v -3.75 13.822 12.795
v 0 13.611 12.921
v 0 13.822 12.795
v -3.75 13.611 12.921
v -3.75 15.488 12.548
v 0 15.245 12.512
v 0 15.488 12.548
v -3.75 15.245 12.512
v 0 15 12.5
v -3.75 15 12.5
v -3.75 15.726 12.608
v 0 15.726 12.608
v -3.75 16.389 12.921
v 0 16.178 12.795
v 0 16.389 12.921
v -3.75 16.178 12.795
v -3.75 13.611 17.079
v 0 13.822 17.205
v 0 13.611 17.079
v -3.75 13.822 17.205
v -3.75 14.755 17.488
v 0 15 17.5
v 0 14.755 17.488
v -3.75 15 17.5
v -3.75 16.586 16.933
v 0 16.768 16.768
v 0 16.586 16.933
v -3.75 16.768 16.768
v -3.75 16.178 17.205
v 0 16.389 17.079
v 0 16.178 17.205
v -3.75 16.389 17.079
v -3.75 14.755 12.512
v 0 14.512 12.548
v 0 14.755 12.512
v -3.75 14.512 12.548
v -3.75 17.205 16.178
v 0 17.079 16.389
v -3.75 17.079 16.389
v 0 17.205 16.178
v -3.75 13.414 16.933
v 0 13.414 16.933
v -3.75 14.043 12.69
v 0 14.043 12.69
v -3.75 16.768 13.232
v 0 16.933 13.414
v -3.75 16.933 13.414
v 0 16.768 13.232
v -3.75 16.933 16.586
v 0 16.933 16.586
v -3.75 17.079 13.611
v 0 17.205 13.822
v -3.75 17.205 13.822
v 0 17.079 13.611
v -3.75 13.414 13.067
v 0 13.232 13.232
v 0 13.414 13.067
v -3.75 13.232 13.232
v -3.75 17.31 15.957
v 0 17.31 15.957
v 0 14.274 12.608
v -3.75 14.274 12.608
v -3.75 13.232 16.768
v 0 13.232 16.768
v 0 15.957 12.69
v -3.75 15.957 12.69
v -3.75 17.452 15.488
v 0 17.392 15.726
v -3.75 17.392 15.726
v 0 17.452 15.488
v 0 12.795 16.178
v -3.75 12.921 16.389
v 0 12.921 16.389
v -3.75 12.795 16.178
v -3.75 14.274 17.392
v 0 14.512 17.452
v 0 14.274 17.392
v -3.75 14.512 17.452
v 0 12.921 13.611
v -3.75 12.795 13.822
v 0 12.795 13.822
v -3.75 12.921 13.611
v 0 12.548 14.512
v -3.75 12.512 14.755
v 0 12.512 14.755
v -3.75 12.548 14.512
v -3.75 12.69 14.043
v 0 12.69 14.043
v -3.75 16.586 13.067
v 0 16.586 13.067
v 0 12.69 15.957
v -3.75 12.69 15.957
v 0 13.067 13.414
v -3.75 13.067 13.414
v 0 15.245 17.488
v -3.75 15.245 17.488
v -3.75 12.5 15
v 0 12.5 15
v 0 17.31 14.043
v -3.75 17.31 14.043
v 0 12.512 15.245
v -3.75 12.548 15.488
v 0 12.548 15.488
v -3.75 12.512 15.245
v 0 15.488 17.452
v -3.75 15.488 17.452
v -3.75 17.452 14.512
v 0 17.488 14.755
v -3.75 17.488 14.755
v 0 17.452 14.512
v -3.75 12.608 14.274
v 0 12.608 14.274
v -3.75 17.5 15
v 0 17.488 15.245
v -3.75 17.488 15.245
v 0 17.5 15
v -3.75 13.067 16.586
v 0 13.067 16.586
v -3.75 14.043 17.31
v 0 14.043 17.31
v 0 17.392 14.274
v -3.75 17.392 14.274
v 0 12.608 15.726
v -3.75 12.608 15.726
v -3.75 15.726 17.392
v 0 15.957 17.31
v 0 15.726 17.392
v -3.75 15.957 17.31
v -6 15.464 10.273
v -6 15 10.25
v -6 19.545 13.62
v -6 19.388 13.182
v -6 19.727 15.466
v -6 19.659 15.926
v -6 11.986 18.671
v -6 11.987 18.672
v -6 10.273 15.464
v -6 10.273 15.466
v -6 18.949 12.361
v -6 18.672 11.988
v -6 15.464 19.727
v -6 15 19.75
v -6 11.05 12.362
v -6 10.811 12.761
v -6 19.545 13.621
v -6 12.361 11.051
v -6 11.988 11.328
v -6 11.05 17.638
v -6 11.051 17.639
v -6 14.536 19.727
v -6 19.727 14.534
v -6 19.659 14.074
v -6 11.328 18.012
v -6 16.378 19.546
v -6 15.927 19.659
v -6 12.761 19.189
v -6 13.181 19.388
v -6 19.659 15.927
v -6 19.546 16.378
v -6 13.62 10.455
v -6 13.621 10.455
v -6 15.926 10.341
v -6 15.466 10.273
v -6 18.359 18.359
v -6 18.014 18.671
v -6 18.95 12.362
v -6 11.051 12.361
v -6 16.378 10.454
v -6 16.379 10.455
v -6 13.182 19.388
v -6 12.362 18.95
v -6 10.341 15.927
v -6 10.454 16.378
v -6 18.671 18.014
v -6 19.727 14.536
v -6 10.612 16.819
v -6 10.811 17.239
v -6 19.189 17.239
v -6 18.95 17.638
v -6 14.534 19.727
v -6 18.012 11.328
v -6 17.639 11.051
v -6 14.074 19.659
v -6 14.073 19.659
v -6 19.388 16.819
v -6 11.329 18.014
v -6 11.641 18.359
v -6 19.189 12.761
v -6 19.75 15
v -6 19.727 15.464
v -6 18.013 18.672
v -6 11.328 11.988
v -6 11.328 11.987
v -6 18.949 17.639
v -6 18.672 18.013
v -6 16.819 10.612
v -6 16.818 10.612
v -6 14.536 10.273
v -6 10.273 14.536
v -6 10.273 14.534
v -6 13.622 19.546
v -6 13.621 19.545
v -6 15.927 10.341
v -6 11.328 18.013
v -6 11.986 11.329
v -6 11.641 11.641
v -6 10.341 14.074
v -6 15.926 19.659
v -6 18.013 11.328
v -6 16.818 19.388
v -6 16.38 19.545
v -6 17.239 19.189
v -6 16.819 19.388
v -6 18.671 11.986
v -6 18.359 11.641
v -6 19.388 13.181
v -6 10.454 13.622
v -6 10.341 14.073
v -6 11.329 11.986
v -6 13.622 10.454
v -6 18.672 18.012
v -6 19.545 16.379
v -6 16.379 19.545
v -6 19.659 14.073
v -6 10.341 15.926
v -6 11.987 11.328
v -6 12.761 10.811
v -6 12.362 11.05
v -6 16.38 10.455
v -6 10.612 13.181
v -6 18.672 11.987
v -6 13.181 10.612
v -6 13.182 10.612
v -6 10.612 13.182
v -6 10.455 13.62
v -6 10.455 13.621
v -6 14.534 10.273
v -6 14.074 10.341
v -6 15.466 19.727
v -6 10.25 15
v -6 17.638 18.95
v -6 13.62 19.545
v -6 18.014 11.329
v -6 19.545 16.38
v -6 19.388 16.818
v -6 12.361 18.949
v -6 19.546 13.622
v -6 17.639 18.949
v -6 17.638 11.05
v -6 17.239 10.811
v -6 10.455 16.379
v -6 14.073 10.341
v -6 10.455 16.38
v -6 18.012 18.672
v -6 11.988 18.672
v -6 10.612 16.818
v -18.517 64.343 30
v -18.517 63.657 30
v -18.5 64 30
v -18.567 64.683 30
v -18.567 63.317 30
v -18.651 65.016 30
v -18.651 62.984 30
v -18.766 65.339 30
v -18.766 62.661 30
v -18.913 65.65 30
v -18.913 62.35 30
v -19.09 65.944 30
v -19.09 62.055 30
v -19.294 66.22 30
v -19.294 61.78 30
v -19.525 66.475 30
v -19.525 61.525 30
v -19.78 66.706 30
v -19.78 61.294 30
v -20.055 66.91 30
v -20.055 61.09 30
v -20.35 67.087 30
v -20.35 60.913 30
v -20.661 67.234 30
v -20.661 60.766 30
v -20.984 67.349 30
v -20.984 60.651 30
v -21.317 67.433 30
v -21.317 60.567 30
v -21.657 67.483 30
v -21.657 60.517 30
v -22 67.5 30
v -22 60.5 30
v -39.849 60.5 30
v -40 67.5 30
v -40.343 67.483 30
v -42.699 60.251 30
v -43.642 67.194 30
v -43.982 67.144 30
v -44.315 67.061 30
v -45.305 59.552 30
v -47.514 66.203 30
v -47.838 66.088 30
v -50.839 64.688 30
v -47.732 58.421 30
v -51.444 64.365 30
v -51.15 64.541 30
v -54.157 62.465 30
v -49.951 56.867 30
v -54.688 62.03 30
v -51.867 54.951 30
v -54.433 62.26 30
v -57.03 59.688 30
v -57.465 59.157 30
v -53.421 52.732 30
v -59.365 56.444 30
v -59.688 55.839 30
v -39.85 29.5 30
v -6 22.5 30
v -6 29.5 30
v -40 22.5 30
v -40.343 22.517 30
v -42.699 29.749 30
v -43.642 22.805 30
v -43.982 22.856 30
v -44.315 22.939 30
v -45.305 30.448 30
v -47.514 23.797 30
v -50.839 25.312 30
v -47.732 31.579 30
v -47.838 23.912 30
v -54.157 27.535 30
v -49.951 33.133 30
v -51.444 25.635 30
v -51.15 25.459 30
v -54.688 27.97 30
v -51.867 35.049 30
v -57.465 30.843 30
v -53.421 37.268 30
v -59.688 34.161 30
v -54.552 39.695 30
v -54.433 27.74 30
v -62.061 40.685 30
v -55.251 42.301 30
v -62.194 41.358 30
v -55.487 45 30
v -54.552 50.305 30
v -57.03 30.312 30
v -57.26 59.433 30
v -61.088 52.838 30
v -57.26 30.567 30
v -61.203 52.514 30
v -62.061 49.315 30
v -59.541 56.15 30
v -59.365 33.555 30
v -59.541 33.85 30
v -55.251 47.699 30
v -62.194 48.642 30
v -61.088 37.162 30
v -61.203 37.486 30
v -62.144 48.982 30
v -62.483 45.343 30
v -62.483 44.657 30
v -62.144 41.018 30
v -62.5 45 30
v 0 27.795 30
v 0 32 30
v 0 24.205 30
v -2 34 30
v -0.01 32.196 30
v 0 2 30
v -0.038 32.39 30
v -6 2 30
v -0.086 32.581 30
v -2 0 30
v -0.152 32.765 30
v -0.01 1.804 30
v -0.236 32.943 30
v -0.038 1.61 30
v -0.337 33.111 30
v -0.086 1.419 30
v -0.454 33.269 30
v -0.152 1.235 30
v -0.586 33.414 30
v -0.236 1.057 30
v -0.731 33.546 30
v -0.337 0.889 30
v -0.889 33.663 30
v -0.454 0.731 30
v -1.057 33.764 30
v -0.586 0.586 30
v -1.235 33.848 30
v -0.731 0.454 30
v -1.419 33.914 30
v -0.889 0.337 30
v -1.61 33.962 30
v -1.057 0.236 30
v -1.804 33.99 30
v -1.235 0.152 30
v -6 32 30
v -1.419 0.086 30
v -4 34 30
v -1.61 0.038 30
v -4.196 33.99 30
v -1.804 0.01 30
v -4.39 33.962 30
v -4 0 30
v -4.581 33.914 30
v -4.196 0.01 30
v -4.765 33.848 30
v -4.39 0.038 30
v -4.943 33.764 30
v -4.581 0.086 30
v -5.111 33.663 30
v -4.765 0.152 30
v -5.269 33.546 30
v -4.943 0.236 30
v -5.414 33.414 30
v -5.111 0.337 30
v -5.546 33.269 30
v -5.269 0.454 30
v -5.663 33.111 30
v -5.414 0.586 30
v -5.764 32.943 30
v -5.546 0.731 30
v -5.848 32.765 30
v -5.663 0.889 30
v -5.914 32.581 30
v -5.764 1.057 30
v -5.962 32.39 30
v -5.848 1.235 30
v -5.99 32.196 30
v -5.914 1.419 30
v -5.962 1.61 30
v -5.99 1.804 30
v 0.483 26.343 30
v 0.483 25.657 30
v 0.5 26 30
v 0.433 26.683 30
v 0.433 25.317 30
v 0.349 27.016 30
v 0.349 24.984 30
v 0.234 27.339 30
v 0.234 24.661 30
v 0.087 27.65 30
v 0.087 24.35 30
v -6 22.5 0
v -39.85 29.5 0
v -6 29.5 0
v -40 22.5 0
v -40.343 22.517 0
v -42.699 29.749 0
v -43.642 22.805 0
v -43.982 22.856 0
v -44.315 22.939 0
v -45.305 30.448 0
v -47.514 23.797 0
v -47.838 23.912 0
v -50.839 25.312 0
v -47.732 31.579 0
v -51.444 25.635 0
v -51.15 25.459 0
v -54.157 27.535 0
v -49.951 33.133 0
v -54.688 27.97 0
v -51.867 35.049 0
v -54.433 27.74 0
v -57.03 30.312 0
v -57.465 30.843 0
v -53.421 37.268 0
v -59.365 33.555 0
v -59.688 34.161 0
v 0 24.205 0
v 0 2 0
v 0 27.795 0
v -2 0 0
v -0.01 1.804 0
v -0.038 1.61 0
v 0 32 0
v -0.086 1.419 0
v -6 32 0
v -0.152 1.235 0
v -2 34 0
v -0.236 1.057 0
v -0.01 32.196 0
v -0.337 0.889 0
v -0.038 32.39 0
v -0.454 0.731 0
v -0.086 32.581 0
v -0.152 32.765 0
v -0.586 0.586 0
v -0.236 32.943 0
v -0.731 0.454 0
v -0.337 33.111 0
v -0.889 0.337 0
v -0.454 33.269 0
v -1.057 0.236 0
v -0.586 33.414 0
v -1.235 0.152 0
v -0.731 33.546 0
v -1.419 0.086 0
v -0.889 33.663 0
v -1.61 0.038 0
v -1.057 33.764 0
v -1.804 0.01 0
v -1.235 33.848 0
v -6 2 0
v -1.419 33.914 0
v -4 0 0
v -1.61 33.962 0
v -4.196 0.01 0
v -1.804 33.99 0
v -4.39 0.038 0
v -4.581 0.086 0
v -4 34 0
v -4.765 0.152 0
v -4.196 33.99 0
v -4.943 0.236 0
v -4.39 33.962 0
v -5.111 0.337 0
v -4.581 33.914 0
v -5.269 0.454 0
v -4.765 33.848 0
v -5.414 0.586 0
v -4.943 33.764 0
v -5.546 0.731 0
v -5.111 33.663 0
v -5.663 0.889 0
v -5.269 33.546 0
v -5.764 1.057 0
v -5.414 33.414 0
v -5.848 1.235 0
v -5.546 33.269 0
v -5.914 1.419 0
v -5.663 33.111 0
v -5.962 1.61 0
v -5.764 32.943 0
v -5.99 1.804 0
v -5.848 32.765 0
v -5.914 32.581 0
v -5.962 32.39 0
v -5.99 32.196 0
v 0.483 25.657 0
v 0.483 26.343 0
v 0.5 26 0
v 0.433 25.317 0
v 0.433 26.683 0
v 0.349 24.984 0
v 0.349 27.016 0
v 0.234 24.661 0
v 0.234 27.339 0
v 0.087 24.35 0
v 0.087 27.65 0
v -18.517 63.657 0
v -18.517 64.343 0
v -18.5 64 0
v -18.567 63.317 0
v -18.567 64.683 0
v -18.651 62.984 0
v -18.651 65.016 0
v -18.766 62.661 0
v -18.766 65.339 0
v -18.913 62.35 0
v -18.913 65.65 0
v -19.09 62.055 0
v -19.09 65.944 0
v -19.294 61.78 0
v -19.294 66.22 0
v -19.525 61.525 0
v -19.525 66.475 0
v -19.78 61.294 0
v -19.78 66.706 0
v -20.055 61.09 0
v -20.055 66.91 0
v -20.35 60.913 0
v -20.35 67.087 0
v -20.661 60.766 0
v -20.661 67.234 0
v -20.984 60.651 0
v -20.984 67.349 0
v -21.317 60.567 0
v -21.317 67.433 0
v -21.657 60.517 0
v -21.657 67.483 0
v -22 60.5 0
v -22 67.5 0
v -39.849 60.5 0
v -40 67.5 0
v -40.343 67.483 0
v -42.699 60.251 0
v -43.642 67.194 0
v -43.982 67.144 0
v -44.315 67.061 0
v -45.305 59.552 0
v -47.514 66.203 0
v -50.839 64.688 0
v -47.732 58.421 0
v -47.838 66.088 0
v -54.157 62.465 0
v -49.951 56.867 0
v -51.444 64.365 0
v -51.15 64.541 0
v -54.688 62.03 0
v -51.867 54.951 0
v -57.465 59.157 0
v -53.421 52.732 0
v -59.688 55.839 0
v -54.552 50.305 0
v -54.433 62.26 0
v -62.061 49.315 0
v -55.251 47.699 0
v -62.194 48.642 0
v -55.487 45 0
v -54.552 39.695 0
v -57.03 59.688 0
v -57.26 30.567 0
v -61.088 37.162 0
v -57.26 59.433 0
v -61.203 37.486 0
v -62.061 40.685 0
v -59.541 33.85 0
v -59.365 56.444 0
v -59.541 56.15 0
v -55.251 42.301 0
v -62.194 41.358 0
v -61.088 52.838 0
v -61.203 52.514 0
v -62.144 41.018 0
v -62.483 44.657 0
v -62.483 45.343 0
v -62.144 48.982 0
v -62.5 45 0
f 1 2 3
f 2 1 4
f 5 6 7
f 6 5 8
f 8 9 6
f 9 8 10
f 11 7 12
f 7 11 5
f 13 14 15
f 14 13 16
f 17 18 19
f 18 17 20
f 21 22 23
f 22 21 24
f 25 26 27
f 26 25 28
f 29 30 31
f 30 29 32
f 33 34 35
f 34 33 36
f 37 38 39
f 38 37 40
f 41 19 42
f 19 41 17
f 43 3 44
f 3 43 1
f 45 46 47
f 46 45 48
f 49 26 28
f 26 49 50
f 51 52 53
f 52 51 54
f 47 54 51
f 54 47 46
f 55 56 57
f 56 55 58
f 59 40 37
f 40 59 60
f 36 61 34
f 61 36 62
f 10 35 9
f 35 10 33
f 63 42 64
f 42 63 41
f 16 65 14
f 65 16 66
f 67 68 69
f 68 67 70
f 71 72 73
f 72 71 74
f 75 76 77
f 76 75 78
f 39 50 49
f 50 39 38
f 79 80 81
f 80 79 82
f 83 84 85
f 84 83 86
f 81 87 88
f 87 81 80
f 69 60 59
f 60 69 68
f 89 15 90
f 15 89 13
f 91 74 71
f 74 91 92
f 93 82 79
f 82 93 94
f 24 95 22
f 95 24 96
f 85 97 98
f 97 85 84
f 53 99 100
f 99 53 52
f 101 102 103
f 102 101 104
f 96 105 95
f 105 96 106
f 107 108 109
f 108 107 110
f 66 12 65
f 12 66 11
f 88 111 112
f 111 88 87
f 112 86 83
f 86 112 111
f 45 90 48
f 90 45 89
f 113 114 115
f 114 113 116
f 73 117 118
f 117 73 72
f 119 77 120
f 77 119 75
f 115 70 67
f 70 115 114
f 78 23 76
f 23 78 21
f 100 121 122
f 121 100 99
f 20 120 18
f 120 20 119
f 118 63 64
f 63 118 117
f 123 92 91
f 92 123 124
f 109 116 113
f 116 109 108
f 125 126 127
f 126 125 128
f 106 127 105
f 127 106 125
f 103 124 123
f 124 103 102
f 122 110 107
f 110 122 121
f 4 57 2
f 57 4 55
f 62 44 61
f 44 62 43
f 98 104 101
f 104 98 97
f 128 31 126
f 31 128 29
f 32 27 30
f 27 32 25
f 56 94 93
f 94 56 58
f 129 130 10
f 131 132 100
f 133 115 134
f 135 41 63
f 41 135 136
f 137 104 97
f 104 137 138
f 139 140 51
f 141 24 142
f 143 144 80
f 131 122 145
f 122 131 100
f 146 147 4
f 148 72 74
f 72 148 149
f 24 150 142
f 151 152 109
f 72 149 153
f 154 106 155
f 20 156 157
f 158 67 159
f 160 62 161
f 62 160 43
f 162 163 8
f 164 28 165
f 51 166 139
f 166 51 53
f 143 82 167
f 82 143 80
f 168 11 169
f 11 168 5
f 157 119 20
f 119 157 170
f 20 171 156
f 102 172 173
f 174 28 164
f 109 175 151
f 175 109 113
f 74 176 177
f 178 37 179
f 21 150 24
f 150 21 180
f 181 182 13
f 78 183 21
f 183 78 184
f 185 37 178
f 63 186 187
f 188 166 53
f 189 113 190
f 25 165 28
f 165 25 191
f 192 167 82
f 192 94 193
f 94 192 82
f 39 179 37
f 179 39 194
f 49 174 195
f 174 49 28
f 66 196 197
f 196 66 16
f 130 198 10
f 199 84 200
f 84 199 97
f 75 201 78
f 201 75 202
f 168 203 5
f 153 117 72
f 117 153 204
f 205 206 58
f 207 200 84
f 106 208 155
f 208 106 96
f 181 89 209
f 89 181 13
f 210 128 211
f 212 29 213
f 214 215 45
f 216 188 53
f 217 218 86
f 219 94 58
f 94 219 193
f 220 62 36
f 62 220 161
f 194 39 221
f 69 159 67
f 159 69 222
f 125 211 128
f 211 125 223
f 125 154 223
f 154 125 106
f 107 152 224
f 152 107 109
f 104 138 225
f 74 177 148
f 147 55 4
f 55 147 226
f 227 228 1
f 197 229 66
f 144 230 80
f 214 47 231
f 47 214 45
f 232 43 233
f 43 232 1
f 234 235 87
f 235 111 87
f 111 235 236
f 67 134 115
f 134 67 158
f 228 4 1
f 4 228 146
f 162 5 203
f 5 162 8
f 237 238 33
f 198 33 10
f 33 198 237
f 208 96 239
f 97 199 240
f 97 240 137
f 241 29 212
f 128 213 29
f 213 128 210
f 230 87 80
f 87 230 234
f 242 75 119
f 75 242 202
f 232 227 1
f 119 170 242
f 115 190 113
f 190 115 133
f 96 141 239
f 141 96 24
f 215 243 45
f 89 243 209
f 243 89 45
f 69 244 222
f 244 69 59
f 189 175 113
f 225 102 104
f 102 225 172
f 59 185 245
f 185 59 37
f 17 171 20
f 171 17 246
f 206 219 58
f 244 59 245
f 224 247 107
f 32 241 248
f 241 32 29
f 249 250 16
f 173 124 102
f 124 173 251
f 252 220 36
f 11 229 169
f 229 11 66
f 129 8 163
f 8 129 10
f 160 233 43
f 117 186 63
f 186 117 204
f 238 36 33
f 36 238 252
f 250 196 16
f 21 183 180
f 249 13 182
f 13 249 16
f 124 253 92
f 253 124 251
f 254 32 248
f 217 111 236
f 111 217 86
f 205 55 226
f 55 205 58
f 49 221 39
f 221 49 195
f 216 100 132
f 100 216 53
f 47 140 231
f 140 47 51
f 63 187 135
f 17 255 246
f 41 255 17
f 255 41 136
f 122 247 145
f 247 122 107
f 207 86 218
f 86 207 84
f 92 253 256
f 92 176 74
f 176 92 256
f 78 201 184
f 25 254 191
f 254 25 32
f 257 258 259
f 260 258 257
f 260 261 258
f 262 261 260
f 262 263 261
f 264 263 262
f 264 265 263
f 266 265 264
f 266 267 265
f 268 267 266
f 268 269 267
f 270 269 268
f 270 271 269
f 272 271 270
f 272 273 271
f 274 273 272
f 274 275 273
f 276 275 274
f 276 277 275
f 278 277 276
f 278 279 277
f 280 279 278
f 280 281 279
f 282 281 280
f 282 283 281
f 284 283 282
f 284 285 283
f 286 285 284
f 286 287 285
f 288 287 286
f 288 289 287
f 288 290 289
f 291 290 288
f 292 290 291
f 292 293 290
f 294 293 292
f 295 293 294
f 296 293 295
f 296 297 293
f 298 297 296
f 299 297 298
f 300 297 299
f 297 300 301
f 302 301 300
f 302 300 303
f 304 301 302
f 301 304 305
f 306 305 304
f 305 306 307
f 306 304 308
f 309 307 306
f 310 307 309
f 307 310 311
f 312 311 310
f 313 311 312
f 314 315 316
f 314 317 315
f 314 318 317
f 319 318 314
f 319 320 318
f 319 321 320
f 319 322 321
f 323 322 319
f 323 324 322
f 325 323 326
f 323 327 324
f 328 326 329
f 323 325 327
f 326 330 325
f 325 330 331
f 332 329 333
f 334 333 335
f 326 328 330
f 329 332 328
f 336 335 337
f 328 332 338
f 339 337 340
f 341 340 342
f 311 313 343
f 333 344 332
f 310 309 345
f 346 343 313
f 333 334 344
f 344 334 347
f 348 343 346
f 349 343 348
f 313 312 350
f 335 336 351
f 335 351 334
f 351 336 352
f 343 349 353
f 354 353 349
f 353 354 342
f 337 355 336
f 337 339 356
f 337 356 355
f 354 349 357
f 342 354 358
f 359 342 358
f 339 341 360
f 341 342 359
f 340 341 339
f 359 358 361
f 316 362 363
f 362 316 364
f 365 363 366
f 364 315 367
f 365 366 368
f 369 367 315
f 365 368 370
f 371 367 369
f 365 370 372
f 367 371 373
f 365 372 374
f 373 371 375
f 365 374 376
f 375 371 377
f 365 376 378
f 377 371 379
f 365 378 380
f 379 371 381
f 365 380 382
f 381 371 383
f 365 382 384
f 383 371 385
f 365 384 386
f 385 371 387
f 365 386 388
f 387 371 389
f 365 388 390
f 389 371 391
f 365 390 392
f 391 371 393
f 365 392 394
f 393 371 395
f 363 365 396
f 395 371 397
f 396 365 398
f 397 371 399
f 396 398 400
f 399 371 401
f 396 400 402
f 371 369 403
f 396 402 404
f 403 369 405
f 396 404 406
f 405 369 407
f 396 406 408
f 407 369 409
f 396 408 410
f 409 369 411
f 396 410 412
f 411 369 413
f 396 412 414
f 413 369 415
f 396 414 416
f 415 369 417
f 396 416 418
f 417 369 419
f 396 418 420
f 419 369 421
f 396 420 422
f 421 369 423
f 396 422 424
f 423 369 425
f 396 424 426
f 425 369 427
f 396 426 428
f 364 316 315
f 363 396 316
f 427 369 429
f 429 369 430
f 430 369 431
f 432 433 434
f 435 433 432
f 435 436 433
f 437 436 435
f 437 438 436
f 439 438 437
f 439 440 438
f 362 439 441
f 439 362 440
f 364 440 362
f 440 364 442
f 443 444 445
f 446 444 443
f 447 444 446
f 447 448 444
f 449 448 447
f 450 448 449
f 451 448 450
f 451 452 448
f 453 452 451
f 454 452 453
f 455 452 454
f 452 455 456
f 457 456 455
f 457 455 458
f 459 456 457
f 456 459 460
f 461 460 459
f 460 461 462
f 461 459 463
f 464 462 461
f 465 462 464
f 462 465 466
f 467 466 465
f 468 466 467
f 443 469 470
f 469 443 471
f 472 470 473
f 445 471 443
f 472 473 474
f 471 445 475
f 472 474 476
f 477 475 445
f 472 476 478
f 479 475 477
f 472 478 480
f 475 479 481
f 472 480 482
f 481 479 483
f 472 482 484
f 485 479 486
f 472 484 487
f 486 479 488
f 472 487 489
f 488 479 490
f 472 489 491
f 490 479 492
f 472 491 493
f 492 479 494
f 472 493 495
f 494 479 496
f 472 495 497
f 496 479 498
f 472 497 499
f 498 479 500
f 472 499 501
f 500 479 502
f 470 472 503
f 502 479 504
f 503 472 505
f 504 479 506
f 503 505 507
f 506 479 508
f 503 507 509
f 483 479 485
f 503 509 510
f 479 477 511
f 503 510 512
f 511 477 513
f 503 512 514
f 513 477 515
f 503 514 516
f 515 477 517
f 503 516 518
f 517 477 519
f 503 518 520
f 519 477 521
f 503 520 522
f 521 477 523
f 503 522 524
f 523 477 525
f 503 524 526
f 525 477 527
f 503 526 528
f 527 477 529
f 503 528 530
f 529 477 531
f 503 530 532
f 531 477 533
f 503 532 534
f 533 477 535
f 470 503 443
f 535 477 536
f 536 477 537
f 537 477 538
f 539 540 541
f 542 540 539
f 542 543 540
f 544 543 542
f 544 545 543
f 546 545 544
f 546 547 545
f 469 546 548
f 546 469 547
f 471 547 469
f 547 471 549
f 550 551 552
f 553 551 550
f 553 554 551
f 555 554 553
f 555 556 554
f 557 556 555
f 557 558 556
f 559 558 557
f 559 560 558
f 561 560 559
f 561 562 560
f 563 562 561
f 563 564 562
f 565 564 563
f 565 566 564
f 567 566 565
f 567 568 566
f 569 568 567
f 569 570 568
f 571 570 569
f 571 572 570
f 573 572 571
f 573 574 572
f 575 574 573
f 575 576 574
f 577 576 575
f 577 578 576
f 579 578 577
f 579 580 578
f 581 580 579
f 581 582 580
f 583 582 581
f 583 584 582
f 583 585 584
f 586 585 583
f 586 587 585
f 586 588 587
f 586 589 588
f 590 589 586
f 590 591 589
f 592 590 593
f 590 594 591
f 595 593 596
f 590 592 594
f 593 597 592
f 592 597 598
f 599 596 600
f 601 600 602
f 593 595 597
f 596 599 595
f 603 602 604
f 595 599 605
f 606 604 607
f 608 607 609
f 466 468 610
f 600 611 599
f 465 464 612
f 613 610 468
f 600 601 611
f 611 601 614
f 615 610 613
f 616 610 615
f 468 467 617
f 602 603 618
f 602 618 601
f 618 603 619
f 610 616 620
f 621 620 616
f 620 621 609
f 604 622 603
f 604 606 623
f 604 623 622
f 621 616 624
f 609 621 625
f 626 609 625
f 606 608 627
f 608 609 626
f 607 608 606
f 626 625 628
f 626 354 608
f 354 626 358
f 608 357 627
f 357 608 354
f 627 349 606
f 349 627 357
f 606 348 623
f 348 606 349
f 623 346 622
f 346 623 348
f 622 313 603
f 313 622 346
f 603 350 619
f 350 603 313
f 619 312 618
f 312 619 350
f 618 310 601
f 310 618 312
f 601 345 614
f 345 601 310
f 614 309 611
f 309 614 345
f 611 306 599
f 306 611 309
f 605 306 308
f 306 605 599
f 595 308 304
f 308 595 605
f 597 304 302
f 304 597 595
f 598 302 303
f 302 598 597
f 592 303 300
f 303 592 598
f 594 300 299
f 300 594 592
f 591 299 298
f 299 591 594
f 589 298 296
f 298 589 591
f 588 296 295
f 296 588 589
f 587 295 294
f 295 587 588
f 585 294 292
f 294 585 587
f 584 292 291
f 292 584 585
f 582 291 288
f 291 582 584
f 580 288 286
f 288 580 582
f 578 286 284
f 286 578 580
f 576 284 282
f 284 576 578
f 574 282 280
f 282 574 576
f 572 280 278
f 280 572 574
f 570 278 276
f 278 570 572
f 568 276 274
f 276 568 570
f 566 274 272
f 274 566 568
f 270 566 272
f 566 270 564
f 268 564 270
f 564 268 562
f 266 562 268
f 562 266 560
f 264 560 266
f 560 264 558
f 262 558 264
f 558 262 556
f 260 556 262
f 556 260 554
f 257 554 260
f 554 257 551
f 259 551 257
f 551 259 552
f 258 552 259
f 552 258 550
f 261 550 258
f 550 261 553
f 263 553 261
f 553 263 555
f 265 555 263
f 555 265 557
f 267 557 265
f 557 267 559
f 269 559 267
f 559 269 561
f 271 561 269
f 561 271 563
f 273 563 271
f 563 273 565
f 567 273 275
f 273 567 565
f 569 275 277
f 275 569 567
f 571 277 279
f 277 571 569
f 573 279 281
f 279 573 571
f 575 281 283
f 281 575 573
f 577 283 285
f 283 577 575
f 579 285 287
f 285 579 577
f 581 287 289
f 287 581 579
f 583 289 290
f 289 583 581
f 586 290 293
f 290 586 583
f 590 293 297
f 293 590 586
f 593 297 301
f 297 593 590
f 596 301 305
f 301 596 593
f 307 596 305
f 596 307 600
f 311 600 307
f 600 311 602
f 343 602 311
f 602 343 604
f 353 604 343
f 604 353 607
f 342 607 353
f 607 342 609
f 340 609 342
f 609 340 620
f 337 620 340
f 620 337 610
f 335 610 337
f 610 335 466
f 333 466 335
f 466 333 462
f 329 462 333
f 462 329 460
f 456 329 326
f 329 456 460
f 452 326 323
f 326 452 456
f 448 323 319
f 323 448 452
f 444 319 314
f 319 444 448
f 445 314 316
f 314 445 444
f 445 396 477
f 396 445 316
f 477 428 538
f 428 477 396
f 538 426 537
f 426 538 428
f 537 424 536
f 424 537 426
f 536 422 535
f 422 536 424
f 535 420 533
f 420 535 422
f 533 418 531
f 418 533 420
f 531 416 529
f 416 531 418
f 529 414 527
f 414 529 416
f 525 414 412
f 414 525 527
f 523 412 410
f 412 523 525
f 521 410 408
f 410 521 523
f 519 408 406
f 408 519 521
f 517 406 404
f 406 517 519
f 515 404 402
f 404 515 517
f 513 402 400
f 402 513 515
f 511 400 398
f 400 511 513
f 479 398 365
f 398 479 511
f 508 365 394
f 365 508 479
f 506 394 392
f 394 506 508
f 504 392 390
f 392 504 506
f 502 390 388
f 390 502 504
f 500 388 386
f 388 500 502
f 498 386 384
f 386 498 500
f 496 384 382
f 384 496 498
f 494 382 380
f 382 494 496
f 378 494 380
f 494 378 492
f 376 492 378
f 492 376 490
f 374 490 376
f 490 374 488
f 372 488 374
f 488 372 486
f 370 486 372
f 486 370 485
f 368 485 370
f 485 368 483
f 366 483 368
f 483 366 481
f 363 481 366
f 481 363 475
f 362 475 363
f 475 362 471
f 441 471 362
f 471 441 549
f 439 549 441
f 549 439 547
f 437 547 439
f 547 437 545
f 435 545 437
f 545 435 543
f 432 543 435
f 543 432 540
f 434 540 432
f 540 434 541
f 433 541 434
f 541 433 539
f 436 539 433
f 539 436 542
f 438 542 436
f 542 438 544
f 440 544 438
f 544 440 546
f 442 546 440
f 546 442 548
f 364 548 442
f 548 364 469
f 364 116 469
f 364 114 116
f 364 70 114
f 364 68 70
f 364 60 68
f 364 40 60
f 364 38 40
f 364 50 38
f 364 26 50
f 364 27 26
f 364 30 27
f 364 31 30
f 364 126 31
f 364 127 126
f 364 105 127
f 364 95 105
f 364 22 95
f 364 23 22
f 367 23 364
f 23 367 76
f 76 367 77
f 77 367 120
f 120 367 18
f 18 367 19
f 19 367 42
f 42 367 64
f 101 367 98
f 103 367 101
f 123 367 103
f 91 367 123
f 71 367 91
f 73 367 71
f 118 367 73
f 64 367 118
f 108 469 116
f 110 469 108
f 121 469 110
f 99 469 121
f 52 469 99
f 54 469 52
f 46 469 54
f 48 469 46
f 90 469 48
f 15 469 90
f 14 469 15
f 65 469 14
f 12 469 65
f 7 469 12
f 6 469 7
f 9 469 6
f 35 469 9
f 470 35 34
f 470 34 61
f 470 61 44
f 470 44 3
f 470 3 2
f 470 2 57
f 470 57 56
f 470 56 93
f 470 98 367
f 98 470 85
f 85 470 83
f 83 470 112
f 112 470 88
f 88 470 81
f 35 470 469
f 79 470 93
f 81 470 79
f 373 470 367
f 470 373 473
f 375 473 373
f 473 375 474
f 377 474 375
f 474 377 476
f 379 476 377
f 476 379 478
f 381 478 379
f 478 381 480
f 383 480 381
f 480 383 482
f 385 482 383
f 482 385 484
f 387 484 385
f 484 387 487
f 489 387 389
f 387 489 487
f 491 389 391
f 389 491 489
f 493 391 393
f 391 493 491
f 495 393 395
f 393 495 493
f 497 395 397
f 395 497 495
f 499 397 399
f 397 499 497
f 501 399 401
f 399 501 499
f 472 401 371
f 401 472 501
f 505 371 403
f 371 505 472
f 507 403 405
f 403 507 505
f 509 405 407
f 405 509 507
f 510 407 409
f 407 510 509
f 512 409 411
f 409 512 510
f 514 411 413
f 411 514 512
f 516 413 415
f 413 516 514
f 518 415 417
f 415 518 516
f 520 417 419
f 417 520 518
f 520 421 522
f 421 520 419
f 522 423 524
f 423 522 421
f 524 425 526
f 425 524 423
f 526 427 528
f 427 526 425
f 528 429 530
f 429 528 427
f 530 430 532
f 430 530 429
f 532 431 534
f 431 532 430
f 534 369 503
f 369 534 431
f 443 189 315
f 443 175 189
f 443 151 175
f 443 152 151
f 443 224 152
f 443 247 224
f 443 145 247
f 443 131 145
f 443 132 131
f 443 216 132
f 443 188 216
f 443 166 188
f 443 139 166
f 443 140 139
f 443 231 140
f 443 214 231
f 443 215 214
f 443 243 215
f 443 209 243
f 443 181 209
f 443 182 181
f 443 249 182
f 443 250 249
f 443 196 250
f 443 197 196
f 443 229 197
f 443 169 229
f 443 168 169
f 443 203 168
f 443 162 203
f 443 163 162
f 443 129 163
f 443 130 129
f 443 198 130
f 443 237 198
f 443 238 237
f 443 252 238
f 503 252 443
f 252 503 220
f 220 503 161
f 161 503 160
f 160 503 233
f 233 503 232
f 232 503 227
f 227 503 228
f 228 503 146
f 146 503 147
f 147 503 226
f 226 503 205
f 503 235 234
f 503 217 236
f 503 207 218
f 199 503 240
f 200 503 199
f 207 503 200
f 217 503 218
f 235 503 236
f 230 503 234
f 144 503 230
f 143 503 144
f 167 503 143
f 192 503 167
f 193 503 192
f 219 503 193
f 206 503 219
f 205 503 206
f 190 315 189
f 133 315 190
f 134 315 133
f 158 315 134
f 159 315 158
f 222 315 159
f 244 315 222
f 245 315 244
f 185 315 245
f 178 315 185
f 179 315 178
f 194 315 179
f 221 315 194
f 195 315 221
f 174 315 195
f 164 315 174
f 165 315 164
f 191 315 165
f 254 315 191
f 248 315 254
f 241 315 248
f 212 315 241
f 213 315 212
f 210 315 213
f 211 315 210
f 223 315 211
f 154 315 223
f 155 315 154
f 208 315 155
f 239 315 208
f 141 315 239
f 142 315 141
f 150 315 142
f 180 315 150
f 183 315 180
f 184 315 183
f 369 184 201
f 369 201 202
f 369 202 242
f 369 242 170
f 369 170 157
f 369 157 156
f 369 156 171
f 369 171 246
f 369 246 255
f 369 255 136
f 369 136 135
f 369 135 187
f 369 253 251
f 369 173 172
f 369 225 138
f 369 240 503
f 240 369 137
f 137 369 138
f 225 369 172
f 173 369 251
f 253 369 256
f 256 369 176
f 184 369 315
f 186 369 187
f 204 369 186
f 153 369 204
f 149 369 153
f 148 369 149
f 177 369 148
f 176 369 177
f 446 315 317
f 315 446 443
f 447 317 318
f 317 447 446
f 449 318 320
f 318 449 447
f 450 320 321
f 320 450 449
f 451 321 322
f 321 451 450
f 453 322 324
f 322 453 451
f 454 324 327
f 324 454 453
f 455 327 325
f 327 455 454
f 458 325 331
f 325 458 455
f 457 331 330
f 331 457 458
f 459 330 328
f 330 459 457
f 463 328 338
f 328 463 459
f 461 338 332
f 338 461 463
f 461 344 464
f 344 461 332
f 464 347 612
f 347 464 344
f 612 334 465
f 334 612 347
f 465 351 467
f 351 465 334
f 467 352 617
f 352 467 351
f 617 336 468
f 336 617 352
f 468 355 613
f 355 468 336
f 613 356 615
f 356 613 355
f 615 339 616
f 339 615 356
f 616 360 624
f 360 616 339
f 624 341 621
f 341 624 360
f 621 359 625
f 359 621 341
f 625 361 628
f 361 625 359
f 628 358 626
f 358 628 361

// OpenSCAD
// ---------------------------------------------------------------------------
// Under-desk headphone hook
//
// A J that screws to the underside of a desk and hangs headphones off it. One
// screw, through a pad that sits flat against the desk.
//
// The whole thing is a profile swept across its width, so it prints lying on
// its side: nothing overhangs, and the layers run along the arm rather than
// across it, which is the direction the load pulls.
//
//   x = width,  y = out from the back of the pad,  z = height, 0 = desk
//
// Render:  openscad -o hook.stl under_desk_headphone_hook.scad
// ---------------------------------------------------------------------------

/* [Hook] */
WIDTH  = 30.0;           // across; wide enough not to crease a headband
BAR    = 7.0;            // bar thickness
DROP   = 40.0;           // straight arm below the desk before the cradle
THROAT = 38.0;           // centreline gap. What matters is what is left after
                         // the bar: THROAT - BAR has to swallow a padded band
TIP    = 18.0;           // how far the far side rises to stop it slipping off
ARM_Y  = 26.0;           // how far forward the arm hangs, from the pad's back

/* [Pad] */
PAD_D = 34.0;            // front to back
PAD_T = 6.0;             // thick enough to countersink into
PAD_R = 2.0;             // edge rounding in section; must clear PAD_T/2

/* [Fastener] One #8 or M4 flat-head wood screw */
SCREW_D    = 5.0;
HEAD_D     = 9.5;
CSK_ANGLE  = 90.0;
SCREW_Y    = 15.0;       // from the back of the pad; set so a driver clears the arm
DRIVER_CLR = 1.5;

/* [Output] */
PRINT_ORIENTATION = true;    // on its side, which is how it prints
$fn = 64;

// --------------------------- derived --------------------------------------

R = THROAT / 2;                  // cradle radius, centreline
CSK_DEPTH = (HEAD_D - SCREW_D) / 2 / tan(CSK_ANGLE / 2);
BOT = -DROP - R;                 // lowest point of the centreline
EPS = 0.01;

assert(PAD_T > CSK_DEPTH + 1.5, "too little pad left under the countersink");
assert(PAD_R < PAD_T / 2 && PAD_R < PAD_D / 2,
       "PAD_R is larger than the pad it rounds - the pad would come out empty");
assert(ARM_Y + BAR / 2 <= PAD_D, "the arm hangs off the front of the pad");
assert(HEAD_D + 4 < PAD_D, "no room for a screw head on the pad");
assert(SCREW_Y + HEAD_D / 2 + DRIVER_CLR <= ARM_Y - BAR / 2,
       "the arm crowds the screw head; move the screw back or the arm forward");
assert(SCREW_Y - HEAD_D / 2 > 1, "the screw head runs off the back of the pad");
assert(TIP < DROP, "the tip rises past the desk");
assert(THROAT - BAR >= 30, "the throat will not swallow a padded headband");

// --------------------------- helpers --------------------------------------

// A rounded bar swept along a centreline: hull each pair of points with a
// circle of the bar's thickness. Keeps every corner radiused, which is what
// you want against a headband.
module bar(pts) {
    for (i = [0 : len(pts) - 2])
        hull() {
            translate(pts[i]) circle(d = BAR);
            translate(pts[i + 1]) circle(d = BAR);
        }
}

// --------------------------- the part --------------------------------------

// Centreline: down the arm, round the cradle, back up to the tip.
ARC = [for (a = [0 : 10 : 180]) [ARM_Y + R - R * cos(a), -DROP - R * sin(a)]];

module profile() {
    // Mounting pad.
    translate([PAD_R, -PAD_T + PAD_R])
        offset(r = PAD_R) square([PAD_D - 2 * PAD_R, PAD_T - 2 * PAD_R]);
    // Arm, cradle, tip.
    bar(concat([[ARM_Y, -PAD_T / 2]], ARC,
               [[ARM_Y + 2 * R, -DROP + TIP]]));
}

module hook() {
    difference() {
        // profile is drawn in (y, z); sweep it across the width
        translate([-WIDTH / 2, 0, 0]) rotate([0, 90, 0]) rotate([0, 0, 90])
            linear_extrude(height = WIDTH) profile();
        // Screw, countersunk from below.
        translate([0, SCREW_Y, -PAD_T - EPS]) {
            cylinder(h = PAD_T + 2 * EPS, d = SCREW_D);
            cylinder(h = CSK_DEPTH + EPS, d1 = HEAD_D + 2 * EPS, d2 = SCREW_D);
        }
    }
}

if (PRINT_ORIENTATION) translate([0, 0, WIDTH / 2]) rotate([0, 90, 0]) hook();
else hook();
